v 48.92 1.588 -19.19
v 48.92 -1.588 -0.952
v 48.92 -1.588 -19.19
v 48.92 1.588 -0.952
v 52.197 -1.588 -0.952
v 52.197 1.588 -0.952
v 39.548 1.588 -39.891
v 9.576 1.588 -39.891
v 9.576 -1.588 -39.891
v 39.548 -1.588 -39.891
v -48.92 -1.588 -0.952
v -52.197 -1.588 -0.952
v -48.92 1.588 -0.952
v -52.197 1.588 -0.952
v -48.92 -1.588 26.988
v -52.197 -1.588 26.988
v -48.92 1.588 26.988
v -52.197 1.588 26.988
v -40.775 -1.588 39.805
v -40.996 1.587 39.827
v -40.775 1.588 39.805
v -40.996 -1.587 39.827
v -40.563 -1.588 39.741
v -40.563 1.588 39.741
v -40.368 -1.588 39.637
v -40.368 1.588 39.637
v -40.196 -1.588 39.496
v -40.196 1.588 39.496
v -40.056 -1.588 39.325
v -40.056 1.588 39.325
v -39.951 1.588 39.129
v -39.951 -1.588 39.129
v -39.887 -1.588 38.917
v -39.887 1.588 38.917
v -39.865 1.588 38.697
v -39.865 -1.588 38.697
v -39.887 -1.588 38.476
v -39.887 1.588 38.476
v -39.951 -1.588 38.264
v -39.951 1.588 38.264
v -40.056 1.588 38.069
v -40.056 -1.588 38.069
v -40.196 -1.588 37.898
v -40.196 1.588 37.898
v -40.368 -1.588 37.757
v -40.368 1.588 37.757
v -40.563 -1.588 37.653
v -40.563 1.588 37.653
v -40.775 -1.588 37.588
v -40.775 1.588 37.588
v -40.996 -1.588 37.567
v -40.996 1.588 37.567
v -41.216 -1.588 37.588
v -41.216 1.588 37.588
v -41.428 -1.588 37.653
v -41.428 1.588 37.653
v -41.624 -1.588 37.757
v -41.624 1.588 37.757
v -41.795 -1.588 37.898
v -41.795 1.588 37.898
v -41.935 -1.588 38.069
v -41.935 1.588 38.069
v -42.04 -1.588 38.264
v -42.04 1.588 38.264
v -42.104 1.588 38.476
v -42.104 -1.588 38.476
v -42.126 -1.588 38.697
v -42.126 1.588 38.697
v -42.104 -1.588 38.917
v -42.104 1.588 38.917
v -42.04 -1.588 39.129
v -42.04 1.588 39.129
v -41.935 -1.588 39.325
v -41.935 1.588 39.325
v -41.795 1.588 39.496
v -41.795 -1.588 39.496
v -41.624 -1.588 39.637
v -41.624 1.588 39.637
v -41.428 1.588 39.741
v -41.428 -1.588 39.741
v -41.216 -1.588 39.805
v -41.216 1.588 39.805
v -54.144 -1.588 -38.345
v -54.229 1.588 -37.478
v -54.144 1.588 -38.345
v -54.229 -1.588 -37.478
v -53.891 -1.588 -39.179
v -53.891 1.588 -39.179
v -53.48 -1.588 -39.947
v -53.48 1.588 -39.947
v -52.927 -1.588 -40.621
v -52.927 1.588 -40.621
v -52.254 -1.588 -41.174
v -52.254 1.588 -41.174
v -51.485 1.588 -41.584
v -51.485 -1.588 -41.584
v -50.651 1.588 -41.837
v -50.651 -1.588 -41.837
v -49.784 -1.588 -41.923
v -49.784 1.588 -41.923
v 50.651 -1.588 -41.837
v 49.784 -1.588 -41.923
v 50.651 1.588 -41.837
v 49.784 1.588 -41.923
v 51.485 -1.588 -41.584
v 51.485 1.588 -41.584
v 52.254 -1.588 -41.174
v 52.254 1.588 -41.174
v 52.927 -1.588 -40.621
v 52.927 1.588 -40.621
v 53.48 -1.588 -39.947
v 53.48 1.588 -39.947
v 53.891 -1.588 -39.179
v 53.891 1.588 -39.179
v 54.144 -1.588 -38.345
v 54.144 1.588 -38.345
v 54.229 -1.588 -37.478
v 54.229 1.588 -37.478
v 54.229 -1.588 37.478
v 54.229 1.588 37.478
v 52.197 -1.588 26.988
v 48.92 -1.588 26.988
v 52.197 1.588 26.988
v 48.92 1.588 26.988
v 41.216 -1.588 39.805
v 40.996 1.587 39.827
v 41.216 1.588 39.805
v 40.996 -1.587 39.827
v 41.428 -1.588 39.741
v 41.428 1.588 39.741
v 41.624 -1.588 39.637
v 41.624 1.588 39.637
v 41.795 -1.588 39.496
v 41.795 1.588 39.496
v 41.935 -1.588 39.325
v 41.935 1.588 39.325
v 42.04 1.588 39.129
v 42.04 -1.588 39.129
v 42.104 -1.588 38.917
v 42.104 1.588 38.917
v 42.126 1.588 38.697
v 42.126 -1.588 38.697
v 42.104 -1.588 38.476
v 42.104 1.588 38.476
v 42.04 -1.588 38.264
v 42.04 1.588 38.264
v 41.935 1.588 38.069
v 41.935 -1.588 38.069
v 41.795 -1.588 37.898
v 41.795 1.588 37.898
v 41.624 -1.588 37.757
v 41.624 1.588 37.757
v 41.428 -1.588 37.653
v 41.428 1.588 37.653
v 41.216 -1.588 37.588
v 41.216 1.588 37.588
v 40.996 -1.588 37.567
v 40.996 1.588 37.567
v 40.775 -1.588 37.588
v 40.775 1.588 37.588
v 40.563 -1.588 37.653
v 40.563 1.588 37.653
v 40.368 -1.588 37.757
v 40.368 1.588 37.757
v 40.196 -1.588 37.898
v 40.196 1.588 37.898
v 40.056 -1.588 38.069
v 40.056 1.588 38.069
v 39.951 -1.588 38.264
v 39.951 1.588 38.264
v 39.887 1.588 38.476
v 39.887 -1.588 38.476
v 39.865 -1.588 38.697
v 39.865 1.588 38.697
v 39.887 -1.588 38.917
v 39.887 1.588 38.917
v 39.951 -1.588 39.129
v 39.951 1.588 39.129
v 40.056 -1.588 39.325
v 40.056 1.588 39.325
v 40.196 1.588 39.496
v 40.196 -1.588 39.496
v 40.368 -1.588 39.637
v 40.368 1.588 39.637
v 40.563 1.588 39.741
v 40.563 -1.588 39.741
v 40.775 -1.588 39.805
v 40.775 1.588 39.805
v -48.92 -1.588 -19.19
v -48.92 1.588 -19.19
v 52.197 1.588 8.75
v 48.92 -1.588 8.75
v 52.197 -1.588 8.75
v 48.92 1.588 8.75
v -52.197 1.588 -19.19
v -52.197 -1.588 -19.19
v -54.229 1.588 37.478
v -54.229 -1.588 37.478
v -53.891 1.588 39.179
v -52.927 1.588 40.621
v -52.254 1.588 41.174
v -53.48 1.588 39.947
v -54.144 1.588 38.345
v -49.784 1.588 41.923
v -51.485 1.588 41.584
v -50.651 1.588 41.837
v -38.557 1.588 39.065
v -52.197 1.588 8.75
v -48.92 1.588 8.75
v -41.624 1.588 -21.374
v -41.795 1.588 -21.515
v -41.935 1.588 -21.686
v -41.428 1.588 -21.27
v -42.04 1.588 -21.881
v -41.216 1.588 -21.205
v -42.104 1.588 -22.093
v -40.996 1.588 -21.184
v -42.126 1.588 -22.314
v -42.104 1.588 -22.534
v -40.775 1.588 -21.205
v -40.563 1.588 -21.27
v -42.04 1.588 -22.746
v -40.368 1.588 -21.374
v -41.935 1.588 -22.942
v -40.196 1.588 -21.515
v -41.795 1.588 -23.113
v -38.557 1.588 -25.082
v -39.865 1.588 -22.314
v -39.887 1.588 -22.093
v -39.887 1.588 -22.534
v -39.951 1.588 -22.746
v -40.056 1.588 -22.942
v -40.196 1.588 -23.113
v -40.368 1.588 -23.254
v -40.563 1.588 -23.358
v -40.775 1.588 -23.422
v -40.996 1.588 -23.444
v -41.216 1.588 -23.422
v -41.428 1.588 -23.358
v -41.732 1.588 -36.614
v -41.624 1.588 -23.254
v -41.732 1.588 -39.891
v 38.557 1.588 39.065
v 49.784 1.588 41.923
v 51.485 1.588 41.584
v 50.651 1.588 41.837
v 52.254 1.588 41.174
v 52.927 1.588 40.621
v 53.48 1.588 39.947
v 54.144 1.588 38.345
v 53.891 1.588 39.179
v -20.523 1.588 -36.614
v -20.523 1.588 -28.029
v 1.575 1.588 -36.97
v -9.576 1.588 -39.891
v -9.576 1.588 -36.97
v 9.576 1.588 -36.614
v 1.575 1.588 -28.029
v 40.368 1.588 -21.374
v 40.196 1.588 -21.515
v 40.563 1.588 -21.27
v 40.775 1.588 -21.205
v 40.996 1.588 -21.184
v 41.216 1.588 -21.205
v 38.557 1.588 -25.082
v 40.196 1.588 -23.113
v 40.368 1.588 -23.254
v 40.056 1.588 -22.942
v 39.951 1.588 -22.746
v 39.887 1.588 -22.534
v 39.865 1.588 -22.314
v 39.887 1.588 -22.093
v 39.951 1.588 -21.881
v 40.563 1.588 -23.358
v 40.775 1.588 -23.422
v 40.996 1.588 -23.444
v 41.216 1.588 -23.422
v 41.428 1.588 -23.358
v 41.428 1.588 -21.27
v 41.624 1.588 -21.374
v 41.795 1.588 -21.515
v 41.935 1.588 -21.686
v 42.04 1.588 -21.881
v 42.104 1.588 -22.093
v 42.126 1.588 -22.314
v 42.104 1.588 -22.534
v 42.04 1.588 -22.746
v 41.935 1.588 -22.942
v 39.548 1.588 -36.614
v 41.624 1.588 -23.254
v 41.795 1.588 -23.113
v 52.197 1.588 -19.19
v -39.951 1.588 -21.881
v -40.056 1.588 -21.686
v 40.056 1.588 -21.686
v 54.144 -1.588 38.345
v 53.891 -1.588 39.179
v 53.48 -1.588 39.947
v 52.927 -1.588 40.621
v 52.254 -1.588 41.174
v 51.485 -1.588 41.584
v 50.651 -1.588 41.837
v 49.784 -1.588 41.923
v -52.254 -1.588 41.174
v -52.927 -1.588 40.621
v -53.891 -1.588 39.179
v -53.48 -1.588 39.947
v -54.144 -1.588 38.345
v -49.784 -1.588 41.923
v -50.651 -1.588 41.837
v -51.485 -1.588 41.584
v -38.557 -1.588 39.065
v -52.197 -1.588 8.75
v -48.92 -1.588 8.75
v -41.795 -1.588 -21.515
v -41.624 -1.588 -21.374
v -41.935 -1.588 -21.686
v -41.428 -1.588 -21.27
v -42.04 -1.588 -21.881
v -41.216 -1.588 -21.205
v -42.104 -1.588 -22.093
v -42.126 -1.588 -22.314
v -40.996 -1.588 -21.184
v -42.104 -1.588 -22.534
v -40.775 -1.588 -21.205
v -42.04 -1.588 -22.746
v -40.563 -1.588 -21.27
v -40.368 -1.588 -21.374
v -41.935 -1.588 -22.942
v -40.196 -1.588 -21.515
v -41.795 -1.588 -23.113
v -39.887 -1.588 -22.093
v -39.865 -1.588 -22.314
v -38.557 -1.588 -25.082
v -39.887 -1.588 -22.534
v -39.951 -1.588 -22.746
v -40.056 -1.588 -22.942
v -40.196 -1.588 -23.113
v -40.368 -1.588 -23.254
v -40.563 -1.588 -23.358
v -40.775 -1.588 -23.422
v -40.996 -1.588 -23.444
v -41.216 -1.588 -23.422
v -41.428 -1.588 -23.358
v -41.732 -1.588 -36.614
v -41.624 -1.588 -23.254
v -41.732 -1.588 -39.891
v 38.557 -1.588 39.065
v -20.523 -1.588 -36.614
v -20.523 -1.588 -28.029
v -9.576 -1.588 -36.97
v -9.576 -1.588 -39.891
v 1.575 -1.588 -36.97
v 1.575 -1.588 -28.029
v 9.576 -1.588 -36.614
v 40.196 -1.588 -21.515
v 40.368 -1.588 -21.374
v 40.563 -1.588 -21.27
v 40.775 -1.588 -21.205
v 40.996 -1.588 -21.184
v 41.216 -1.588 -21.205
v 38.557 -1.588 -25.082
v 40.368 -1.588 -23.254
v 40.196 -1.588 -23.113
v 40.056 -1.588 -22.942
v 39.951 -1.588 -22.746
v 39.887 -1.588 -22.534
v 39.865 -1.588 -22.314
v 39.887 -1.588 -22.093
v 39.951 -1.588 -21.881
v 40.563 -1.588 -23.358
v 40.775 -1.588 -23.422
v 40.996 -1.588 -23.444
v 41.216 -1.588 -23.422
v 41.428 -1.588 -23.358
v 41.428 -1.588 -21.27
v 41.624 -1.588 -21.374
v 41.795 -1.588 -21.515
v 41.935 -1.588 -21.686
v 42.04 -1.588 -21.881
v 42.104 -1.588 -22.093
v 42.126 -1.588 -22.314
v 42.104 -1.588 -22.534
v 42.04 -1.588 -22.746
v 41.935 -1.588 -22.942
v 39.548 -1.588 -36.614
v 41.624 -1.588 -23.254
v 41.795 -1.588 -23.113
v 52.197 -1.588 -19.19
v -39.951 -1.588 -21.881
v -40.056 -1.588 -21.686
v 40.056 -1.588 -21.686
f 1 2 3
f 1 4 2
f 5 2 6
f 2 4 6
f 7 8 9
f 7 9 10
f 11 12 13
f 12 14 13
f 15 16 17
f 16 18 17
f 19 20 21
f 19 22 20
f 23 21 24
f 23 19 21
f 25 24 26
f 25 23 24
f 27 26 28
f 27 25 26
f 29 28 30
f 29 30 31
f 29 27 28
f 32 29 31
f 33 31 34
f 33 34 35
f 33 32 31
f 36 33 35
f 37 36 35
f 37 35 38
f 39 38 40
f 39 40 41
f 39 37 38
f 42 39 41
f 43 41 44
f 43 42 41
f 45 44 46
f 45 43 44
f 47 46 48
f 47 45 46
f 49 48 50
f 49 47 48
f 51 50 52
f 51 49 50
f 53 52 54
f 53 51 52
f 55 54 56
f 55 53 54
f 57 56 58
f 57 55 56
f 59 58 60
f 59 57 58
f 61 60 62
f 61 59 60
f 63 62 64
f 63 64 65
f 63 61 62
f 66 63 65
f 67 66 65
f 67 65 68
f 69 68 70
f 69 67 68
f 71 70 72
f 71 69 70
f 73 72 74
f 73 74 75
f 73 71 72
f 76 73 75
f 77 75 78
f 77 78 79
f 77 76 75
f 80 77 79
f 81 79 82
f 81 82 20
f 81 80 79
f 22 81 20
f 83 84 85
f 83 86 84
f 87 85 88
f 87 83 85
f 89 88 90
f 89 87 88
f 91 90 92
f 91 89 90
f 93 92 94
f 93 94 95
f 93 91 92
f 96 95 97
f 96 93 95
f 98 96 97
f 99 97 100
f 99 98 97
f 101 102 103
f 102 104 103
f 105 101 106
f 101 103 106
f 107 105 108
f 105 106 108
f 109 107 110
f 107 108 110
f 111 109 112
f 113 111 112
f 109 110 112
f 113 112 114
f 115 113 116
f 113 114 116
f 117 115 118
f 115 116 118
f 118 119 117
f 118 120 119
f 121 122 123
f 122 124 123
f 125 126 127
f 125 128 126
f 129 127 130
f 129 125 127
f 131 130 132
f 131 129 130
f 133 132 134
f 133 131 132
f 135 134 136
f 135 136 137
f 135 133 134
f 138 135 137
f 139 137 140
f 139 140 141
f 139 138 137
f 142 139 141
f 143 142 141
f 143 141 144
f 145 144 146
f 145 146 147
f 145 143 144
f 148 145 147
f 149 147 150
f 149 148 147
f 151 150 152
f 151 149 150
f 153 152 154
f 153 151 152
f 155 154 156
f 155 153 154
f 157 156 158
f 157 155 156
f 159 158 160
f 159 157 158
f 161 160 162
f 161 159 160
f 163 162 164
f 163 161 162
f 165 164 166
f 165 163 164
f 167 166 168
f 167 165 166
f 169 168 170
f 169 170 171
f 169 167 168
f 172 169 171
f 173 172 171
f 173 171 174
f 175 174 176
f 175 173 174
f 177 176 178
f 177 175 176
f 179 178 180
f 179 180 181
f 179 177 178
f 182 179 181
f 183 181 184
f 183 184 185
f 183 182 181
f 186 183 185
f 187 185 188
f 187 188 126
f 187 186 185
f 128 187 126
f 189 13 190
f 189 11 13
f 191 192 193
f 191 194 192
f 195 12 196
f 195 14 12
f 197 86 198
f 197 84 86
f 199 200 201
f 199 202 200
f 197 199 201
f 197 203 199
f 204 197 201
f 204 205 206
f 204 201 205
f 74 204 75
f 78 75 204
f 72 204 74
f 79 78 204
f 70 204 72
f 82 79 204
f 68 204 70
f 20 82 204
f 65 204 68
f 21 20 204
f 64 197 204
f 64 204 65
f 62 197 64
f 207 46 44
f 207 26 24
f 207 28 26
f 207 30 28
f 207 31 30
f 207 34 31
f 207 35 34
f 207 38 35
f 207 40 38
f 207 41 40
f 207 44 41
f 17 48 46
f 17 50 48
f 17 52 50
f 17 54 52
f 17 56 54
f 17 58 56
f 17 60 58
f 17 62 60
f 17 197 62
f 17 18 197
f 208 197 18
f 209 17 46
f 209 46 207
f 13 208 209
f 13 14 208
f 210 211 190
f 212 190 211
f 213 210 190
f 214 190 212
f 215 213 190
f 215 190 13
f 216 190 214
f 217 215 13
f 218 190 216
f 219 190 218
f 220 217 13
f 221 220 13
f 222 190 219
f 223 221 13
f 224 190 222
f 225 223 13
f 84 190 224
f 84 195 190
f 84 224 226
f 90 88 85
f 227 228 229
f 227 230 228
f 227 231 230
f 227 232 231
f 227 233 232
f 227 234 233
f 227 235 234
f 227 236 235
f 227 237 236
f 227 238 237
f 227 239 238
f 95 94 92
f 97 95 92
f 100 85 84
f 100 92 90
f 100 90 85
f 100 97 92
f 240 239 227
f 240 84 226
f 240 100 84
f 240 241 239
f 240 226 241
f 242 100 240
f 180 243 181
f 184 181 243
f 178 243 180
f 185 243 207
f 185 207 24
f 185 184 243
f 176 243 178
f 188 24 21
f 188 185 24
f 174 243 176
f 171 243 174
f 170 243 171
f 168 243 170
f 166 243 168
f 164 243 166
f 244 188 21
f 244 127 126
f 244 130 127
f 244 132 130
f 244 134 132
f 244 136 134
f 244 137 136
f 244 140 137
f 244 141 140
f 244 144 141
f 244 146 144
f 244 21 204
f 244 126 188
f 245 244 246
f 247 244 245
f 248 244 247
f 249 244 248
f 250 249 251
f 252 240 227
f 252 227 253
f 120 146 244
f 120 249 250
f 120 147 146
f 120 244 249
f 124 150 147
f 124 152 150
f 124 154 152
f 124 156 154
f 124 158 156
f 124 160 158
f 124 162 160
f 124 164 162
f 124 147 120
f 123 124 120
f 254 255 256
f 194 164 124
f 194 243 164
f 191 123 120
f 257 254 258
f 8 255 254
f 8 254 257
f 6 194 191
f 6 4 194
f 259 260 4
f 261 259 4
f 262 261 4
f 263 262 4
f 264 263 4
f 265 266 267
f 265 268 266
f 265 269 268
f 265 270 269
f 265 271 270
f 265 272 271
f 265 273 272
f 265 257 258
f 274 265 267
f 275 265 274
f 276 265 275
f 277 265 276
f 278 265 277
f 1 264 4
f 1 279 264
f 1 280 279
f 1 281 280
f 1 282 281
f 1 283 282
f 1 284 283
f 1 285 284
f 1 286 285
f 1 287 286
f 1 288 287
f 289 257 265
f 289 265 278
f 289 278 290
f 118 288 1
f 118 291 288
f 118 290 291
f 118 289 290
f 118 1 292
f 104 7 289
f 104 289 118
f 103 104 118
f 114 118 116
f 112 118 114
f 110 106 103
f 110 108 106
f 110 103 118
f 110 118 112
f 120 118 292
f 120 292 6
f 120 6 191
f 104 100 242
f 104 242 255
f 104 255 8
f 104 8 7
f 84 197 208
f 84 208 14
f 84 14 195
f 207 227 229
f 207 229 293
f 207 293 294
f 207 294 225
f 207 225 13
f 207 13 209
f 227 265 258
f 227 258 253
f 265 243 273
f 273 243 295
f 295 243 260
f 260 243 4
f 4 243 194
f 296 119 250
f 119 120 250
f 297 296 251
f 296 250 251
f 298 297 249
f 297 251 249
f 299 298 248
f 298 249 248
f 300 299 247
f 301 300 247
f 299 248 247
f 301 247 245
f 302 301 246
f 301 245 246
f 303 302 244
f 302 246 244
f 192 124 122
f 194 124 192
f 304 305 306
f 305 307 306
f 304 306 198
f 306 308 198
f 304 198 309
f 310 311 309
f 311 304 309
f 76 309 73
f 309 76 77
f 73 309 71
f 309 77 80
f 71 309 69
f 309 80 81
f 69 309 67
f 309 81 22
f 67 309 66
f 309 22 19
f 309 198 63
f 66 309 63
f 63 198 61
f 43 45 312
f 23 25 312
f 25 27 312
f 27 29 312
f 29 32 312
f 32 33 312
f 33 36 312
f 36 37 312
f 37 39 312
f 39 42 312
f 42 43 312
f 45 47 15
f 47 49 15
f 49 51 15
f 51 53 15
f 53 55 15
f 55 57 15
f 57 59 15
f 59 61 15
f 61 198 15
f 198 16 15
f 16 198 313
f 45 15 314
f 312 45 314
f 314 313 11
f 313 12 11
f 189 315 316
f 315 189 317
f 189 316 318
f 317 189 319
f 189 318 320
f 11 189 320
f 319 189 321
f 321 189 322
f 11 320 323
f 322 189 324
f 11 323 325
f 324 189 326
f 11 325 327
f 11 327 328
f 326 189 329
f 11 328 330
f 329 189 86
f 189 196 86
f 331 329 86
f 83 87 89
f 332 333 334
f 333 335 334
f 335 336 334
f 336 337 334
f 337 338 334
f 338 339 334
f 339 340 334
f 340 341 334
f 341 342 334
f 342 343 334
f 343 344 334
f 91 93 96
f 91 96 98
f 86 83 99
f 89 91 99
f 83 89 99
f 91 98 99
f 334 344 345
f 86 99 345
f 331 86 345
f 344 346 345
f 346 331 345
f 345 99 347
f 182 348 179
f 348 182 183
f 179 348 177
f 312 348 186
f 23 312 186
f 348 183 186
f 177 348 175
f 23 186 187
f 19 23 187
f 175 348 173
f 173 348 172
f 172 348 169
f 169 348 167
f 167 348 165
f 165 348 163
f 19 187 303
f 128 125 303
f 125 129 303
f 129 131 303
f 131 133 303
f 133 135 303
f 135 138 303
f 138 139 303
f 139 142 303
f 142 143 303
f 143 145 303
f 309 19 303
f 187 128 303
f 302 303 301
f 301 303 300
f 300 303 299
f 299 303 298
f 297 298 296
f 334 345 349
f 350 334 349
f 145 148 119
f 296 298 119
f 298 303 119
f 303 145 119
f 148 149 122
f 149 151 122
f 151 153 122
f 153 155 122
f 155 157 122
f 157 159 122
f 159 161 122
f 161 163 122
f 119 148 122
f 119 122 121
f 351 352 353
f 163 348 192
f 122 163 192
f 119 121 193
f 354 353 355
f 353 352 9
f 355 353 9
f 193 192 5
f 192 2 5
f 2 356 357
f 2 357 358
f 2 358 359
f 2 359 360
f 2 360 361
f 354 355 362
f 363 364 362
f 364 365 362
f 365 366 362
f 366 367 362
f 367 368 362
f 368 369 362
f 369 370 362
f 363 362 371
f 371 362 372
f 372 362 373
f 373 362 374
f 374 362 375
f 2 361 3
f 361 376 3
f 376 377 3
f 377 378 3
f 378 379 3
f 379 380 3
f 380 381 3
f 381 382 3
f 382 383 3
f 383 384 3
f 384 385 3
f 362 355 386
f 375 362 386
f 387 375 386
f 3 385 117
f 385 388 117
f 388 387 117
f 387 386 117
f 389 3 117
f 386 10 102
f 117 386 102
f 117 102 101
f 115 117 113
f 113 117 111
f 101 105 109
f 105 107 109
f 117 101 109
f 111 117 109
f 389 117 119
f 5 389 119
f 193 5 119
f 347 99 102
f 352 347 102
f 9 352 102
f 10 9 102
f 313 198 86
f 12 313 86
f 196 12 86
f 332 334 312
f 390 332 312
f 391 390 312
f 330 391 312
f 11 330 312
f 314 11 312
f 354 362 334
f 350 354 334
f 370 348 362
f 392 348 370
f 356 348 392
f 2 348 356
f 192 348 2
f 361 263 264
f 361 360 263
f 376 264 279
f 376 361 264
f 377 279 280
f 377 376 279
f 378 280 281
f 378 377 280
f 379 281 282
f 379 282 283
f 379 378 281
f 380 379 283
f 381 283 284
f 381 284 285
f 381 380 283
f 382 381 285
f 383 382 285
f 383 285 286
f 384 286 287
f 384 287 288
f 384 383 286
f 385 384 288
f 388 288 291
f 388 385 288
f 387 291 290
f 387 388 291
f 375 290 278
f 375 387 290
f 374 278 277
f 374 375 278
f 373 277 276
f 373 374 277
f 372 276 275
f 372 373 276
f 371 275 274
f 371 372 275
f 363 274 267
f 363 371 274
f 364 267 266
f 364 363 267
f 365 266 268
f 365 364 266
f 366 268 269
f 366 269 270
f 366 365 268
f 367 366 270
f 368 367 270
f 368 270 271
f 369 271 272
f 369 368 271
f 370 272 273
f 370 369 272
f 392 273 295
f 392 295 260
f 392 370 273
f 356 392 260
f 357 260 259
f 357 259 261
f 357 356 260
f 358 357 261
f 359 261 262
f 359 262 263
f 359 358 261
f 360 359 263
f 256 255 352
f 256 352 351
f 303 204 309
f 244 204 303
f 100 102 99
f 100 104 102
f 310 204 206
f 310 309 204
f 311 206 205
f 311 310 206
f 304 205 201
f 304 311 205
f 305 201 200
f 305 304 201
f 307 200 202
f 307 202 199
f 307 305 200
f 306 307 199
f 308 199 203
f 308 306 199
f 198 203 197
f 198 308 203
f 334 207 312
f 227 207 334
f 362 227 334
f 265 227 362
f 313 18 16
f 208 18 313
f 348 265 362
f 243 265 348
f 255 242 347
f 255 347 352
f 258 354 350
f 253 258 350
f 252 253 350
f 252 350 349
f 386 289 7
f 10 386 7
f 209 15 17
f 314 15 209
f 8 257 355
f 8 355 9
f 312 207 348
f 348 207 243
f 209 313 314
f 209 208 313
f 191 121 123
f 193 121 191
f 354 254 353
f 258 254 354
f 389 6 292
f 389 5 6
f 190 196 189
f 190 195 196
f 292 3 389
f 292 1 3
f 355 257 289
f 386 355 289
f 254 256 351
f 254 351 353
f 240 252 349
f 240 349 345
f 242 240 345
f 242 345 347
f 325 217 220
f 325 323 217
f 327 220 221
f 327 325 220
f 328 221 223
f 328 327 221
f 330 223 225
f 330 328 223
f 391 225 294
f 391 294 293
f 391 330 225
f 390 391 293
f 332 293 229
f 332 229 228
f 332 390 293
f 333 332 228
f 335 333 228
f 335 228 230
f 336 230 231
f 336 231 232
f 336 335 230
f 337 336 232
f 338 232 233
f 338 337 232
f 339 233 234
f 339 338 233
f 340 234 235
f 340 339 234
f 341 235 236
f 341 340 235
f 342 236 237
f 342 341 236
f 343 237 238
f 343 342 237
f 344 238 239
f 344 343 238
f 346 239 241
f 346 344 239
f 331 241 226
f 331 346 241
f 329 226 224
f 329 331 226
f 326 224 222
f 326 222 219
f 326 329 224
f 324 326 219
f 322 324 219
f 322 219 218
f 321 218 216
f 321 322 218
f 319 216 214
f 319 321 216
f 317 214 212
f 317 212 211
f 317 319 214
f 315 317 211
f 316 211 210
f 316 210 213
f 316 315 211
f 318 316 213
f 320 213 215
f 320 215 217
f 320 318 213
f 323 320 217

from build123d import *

# Parameters (mm, degrees)
SKETCH1_R           = 1.1303
SKETCH1_W           = 3.2766
SKETCH1_H           = 18.2372
BOSS_EXTRUDE1_DEPTH = 1.5875
FILLET1_R           = 4.445
SKETCH2_W           = 81.9912
SKETCH2_H           = 2.0955
BOSS_EXTRUDE2_DEPTH = 3.175
BOSS_EXTRUDE3_DEPTH = 3.175
SKETCH5_W           = 77.1144
SKETCH5_H           = 0.762
BOSS_EXTRUDE4_DEPTH = 3.175


with BuildPart() as part:
    # Sketch1 → Boss-Extrude1 (new, symmetric)
    with BuildSketch(Plane(origin=(0, 0, 0), x_dir=(1, 0, 0), z_dir=(0, 1, 0))):
        Polygon((-38.5572, -41.9227), (-38.5572, 25.0825), (38.5572, 25.0825), (38.5572, -41.9227), (54.229, -41.9227), (54.229, 41.9227), (-54.229, 41.9227), (-54.229, -41.9227), align=None)
        with Locations(Location((-40.9956, -38.6969, 0), (0, 0, 270))):
            Circle(SKETCH1_R, mode=Mode.SUBTRACT)
        with Locations(Location((-40.9956, 22.3139, 0), (0, 0, 270))):
            Circle(SKETCH1_R, mode=Mode.SUBTRACT)
        with Locations(Location((40.9956, 22.3139, 0), (0, 0, 270))):
            Circle(SKETCH1_R, mode=Mode.SUBTRACT)
        with Locations(Location((40.9956, -38.6969, 0), (0, 0, 270))):
            Circle(SKETCH1_R, mode=Mode.SUBTRACT)
        with Locations((-50.5587, 10.0711)):
            Rectangle(SKETCH1_W, SKETCH1_H, mode=Mode.SUBTRACT)
        with Locations((-50.5587, -17.8689)):
            Rectangle(SKETCH1_W, SKETCH1_H, mode=Mode.SUBTRACT)
        with Locations((50.5587, -17.8689)):
            Rectangle(SKETCH1_W, SKETCH1_H, mode=Mode.SUBTRACT)
        with Locations((50.5587, 10.0711)):
            Rectangle(SKETCH1_W, SKETCH1_H, mode=Mode.SUBTRACT)
        Polygon((-20.5232, 36.6141), (-41.7322, 36.6141), (-41.7322, 39.8907), (-9.5758, 39.8907), (-9.5758, 37.2237), (-9.5758, 36.9697), (1.5748, 36.9697), (1.5748, 28.0289), (-20.5232, 28.0289), align=None, mode=Mode.SUBTRACT)
        Polygon((9.5758, 38.590972839), (9.5758, 39.8907), (39.5478, 39.8907), (39.5478, 37.1221), (44.5262, 37.1221), (44.5262, 30.7721), (35.7632, 30.7721), (35.7632, 36.6141), (9.5758, 36.6141), align=None, mode=Mode.SUBTRACT)
    extrude(amount=BOSS_EXTRUDE1_DEPTH, both=True)

    # Fillet1
    fillet1_edges = [part.edges().sort_by_distance(p)[0] for p in [
        (-54.229, 0, -41.9227),
        (54.229, 0, -41.9227),
        (54.229, 0, 41.9227),
        (-54.229, 0, 41.9227),
    ]]
    fillet(fillet1_edges, radius=FILLET1_R)

    # Sketch2 → Boss-Extrude2 (add)
    with BuildSketch(Plane(origin=(0, 1.5875, 0), x_dir=(1, 0, 0), z_dir=(0, 1, 0))):
        with Locations((0, -40.87495)):
            Rectangle(SKETCH2_W, SKETCH2_H)
    extrude(amount=-BOSS_EXTRUDE2_DEPTH)

    # Sketch4 → Boss-Extrude3 (add, through all)
    with BuildSketch(Plane(origin=(0, 1.5875, 0), x_dir=(1, 0, 0), z_dir=(0, 1, 0))):
        Polygon((35.7632, 36.6141), (39.5478, 36.6141), (39.5478, 37.1221), (44.5262, 37.1221), (44.5262, 30.7721), (35.7632, 30.7721), align=None)
    extrude(amount=-BOSS_EXTRUDE3_DEPTH)

    # Sketch5 → Boss-Extrude4 (add)
    with BuildSketch(Plane(origin=(0, 1.5875, 0), x_dir=(1, 0, 0), z_dir=(0, 1, 0))):
        with Locations((0, -39.4462)):
            Rectangle(SKETCH5_W, SKETCH5_H)
    extrude(amount=-BOSS_EXTRUDE4_DEPTH)


solid = part.part
